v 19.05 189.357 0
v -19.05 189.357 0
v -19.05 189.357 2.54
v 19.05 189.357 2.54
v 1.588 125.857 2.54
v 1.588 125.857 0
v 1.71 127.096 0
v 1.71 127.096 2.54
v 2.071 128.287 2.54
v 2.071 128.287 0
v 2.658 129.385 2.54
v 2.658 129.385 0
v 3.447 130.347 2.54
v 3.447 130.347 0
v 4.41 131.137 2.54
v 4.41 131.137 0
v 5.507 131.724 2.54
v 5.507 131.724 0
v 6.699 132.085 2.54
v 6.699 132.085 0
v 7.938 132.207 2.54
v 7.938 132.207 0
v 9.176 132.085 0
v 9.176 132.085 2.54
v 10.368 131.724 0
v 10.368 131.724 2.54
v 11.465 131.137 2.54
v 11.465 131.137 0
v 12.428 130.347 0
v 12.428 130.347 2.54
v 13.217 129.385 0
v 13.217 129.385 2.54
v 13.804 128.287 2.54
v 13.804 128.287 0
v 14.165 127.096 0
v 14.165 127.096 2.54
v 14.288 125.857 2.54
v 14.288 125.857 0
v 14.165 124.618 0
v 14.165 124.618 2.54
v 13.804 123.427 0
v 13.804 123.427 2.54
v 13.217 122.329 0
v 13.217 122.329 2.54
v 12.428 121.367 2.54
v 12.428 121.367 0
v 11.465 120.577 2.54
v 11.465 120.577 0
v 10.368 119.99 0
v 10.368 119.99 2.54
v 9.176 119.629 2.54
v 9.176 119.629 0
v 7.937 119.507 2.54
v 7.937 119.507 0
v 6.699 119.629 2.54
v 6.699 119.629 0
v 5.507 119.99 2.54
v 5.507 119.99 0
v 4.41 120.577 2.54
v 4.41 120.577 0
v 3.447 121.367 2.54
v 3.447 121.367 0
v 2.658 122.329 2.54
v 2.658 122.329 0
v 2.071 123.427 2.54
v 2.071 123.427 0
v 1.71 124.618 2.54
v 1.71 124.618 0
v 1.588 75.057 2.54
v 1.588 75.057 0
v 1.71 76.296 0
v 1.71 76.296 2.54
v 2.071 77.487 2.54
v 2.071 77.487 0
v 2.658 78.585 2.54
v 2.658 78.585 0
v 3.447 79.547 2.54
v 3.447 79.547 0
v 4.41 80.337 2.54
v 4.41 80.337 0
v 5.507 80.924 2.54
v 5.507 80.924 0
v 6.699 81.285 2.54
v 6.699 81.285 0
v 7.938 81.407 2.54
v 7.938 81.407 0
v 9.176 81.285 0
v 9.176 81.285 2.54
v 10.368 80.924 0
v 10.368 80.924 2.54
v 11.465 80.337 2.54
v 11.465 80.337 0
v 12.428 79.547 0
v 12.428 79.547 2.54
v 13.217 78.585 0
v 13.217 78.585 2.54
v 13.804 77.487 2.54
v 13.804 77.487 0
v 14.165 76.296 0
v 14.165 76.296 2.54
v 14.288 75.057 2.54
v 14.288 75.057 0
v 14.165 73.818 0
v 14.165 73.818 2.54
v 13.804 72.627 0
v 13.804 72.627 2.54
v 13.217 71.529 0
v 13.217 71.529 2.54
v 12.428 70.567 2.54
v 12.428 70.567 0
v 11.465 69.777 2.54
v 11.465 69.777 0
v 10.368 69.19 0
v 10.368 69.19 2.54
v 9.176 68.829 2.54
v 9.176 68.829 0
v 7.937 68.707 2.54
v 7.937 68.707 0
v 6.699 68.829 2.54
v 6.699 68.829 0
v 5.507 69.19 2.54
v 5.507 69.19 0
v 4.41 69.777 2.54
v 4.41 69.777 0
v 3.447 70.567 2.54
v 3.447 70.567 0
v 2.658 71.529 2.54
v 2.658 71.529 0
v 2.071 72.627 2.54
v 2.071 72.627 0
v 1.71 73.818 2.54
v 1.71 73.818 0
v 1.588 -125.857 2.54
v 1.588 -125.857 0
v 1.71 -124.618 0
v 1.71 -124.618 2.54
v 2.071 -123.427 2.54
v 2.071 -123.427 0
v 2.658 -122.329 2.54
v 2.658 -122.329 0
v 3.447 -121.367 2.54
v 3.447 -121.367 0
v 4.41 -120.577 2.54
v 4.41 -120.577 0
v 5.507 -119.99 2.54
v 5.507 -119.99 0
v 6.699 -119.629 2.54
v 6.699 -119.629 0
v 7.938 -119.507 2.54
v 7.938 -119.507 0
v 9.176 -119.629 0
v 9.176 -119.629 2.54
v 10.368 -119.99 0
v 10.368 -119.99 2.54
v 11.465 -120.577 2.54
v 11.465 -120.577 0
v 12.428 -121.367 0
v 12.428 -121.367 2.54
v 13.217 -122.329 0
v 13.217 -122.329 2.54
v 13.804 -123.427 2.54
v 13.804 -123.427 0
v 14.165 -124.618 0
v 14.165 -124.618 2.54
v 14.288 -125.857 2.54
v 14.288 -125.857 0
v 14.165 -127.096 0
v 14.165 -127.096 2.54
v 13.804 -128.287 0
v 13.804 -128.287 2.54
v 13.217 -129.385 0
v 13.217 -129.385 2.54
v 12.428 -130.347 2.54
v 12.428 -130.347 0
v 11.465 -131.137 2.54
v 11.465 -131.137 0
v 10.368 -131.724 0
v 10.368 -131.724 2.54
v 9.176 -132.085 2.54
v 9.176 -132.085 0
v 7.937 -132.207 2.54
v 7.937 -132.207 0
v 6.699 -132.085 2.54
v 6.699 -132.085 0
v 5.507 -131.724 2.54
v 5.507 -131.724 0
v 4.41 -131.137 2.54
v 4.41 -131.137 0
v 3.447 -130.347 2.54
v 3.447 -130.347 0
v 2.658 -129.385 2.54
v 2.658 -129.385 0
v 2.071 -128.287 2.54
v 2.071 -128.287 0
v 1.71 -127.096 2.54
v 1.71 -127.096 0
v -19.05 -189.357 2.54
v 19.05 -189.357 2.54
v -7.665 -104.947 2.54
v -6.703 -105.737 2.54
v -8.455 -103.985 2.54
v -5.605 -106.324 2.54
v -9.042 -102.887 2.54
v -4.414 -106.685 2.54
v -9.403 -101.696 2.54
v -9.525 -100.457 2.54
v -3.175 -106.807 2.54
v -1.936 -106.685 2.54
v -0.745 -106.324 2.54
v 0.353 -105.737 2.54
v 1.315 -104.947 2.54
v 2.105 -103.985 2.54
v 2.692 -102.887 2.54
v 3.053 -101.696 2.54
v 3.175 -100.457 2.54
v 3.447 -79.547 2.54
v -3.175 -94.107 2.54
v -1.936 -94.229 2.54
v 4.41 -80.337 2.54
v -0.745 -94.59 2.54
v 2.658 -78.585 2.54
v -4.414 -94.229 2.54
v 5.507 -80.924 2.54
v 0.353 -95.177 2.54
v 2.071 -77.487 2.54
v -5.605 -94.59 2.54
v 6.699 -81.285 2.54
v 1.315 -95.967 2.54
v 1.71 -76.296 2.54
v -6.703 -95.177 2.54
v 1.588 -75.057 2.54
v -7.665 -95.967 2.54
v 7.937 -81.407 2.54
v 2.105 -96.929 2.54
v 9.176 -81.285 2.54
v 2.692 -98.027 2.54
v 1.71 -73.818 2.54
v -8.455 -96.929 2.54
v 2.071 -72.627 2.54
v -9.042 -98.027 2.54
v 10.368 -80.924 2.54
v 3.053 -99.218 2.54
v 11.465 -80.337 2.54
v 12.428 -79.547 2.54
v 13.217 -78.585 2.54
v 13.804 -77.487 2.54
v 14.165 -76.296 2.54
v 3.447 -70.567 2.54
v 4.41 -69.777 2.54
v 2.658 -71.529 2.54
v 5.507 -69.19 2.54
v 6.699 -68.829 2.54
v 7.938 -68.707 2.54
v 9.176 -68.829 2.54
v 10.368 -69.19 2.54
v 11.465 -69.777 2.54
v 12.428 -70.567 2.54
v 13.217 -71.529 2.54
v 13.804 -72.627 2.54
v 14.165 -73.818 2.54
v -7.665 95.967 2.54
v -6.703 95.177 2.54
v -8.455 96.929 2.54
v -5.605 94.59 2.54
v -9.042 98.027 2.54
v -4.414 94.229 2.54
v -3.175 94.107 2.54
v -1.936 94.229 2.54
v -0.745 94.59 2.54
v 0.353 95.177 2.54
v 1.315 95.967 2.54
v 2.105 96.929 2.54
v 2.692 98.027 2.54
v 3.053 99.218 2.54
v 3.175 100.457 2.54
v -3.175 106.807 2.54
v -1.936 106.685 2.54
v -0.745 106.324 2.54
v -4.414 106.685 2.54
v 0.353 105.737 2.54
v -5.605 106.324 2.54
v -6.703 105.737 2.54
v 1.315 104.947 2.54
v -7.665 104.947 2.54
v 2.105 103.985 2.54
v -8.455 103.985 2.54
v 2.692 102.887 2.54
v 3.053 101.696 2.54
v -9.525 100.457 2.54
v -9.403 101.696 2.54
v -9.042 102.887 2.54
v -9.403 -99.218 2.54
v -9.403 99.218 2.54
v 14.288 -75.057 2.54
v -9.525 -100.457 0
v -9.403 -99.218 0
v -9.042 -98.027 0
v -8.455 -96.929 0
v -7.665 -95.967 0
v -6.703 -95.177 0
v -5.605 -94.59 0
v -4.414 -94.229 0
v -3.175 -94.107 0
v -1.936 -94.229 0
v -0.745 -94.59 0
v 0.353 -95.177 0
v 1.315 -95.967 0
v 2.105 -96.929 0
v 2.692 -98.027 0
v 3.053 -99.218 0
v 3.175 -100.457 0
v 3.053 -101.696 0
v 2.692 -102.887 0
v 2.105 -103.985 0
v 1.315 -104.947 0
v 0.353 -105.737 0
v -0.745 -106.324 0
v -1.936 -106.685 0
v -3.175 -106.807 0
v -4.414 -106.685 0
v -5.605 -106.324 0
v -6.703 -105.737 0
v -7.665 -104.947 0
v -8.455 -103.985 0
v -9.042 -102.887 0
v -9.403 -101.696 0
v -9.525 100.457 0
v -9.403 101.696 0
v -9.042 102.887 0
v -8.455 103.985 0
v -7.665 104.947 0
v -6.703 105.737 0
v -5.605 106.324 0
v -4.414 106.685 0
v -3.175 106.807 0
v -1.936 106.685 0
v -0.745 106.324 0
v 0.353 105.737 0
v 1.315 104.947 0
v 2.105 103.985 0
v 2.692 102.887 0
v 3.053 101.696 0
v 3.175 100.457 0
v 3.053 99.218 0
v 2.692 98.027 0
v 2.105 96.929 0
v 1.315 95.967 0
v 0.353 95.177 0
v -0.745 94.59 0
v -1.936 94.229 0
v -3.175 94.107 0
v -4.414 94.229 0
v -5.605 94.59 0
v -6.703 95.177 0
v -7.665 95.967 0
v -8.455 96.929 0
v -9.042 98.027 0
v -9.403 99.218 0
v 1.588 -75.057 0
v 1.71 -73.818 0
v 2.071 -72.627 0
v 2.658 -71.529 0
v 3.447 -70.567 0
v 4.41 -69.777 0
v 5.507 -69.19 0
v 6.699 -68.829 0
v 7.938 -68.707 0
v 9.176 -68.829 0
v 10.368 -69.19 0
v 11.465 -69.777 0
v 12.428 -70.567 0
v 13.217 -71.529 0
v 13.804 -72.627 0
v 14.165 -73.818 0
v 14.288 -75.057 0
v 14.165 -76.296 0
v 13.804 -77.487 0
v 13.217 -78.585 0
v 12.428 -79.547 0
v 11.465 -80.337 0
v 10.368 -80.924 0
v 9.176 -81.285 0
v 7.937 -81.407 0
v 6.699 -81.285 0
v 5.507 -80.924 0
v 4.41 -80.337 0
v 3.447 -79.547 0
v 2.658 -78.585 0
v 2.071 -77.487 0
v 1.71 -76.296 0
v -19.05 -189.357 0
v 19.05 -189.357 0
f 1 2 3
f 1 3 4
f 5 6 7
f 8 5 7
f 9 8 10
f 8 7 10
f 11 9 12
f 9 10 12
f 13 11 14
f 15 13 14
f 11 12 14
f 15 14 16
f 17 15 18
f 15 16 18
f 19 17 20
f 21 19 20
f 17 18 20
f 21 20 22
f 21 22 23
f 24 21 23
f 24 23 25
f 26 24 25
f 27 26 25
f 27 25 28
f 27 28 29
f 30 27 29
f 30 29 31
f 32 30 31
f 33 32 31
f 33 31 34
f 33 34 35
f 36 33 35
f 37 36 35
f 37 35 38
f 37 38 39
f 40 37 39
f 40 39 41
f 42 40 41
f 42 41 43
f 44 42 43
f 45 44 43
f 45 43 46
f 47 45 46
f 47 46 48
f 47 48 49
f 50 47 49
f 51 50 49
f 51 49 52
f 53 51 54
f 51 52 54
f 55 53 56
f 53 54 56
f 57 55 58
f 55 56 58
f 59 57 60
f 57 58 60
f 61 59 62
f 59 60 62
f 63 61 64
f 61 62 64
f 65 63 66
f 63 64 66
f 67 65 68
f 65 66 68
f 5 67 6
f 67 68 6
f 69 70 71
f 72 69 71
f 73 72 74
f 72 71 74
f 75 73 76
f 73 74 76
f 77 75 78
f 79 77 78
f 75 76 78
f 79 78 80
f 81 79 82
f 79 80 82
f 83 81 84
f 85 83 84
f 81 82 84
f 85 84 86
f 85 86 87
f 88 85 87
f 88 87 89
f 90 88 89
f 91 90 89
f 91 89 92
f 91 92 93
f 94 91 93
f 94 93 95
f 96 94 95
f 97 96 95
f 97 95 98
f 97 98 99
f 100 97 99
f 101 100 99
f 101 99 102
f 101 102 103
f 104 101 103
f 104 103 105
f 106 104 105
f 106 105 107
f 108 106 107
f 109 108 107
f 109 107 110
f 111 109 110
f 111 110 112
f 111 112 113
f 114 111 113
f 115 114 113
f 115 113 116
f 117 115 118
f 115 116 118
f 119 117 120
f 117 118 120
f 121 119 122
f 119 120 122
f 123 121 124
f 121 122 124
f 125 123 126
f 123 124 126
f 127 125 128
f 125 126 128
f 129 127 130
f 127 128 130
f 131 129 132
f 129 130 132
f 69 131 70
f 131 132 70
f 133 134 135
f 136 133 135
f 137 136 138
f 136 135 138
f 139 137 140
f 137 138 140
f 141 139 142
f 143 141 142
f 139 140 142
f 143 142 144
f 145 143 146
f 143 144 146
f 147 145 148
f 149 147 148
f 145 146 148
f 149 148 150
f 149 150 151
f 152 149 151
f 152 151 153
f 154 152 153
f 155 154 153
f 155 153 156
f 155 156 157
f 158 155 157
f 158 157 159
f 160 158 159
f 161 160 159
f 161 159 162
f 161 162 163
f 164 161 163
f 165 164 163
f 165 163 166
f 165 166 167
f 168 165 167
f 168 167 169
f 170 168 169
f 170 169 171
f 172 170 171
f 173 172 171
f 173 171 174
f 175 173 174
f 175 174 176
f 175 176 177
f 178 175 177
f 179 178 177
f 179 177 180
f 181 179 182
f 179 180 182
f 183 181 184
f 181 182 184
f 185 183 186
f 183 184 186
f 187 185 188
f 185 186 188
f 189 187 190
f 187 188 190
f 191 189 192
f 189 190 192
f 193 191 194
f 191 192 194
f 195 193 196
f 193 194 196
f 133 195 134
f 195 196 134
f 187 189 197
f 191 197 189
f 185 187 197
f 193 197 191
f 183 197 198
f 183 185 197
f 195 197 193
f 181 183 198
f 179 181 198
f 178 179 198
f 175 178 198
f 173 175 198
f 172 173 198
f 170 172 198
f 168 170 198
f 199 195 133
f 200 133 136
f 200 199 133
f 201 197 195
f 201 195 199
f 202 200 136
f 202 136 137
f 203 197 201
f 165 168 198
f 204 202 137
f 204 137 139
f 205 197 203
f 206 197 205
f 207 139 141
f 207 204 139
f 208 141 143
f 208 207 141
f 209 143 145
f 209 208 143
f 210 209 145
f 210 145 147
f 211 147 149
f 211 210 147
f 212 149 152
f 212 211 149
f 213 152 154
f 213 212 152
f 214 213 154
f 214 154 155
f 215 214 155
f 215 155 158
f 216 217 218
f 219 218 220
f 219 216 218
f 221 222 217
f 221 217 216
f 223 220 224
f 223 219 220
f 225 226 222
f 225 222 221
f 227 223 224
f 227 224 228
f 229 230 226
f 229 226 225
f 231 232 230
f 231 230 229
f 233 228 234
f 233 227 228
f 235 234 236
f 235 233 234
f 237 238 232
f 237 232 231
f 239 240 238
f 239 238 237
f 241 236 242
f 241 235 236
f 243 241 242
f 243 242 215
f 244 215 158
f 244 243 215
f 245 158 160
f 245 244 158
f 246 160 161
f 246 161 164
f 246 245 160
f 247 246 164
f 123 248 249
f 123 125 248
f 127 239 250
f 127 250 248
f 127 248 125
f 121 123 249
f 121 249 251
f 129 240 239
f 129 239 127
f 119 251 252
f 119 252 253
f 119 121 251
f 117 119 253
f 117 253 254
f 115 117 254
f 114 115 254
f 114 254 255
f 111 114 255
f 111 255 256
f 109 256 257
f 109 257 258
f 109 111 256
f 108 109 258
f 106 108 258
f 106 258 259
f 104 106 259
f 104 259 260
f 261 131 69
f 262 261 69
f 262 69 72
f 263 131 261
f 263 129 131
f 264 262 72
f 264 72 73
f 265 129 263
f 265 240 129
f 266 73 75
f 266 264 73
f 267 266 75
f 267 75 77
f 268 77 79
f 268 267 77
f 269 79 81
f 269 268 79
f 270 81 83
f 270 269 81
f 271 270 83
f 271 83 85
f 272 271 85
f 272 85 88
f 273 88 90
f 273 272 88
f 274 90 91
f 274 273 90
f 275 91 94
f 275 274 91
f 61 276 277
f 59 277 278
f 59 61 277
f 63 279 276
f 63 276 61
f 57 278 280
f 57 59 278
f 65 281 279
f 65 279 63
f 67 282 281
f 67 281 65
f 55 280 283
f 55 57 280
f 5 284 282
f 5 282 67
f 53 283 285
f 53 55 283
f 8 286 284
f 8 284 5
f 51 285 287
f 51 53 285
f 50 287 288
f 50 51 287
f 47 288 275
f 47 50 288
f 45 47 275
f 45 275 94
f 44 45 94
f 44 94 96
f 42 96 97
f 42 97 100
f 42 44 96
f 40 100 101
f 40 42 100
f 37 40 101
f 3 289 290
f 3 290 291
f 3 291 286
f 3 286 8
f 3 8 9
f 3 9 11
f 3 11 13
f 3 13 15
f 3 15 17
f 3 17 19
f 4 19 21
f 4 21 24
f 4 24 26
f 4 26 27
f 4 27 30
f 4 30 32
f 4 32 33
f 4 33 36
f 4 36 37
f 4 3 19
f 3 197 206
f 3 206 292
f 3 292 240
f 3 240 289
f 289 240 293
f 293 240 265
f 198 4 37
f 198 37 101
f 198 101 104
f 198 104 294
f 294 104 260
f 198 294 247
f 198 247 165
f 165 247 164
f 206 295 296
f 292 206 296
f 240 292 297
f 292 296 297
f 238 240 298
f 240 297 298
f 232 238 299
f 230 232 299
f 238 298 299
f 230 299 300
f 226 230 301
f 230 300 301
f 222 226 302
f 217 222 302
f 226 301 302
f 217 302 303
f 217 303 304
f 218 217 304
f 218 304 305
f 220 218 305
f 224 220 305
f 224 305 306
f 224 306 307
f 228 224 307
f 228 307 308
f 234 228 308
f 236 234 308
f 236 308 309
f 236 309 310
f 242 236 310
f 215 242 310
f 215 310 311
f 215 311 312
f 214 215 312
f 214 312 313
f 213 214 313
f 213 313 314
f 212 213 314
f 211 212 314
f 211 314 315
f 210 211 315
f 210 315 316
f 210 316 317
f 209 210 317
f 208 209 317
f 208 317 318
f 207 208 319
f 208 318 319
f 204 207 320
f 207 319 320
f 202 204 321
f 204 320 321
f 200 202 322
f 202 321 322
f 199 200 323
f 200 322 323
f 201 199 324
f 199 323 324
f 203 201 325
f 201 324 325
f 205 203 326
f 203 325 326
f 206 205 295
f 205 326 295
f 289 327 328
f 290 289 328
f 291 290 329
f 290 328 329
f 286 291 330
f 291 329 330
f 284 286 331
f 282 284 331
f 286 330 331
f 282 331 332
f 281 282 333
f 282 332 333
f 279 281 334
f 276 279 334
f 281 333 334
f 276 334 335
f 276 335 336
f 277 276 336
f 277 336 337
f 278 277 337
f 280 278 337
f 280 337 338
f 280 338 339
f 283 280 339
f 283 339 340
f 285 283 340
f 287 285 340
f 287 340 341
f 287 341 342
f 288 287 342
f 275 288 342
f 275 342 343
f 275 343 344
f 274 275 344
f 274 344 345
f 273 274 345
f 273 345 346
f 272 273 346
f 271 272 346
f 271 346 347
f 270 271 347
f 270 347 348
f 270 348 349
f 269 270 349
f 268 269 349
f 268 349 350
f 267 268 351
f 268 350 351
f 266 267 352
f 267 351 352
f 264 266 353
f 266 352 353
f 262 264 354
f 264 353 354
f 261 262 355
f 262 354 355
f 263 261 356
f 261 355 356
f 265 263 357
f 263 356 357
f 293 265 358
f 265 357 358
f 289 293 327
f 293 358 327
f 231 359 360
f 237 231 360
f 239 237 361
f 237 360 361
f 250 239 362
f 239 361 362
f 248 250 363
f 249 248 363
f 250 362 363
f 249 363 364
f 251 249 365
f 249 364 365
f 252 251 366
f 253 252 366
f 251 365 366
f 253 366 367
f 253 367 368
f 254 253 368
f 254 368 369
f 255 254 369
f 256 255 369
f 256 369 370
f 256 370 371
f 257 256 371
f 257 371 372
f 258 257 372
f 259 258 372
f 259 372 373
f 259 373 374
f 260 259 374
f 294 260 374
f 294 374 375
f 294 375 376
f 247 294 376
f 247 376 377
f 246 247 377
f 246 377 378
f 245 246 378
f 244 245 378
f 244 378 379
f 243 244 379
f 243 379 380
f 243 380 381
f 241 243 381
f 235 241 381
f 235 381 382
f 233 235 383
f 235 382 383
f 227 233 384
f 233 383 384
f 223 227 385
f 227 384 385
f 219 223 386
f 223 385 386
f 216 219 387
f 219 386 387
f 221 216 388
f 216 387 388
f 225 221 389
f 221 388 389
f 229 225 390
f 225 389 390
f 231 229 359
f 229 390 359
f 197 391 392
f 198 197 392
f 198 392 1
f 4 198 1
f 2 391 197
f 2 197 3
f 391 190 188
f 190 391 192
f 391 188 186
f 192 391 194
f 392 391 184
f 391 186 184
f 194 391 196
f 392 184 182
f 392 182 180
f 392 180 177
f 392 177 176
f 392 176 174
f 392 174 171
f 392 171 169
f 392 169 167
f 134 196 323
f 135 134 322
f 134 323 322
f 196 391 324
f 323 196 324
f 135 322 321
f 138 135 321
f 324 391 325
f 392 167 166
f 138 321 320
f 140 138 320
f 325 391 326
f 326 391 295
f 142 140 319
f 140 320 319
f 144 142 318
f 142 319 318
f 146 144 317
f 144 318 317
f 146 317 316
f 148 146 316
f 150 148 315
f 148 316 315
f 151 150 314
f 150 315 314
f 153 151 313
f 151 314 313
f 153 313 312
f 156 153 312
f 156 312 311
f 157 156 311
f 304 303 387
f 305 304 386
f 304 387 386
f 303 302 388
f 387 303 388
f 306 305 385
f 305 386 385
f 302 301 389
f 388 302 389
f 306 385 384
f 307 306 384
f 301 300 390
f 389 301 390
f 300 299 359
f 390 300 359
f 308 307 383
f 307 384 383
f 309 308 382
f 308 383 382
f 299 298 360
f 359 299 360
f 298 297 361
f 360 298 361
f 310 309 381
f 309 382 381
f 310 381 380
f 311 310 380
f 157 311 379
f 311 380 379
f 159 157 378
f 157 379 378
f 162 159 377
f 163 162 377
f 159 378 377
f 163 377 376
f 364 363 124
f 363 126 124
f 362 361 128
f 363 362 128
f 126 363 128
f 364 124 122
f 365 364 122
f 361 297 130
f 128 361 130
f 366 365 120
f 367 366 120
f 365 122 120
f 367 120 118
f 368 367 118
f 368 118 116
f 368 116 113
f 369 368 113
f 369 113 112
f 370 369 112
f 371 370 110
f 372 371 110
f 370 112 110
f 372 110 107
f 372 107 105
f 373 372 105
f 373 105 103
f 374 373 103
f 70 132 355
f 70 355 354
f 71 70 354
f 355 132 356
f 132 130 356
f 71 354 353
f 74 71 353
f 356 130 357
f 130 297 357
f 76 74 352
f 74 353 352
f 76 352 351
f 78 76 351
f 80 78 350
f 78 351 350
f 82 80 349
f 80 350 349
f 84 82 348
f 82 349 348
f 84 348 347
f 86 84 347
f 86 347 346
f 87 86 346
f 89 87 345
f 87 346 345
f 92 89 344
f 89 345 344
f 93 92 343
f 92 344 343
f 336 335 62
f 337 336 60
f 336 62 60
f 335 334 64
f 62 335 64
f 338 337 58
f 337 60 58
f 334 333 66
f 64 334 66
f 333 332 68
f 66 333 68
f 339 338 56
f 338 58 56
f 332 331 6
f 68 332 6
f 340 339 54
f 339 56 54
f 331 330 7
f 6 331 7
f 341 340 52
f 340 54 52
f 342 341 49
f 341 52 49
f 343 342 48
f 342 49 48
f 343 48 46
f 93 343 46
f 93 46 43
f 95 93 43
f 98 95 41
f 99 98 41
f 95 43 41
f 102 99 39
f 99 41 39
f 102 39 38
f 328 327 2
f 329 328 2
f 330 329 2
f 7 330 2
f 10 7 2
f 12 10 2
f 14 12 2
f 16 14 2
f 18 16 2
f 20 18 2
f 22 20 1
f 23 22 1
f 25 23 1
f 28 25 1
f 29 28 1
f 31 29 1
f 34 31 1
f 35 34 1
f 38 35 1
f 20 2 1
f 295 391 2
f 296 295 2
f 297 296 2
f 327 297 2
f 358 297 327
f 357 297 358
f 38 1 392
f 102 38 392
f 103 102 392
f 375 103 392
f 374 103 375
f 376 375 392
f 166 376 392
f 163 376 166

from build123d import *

# Parameters (mm, degrees)
F0_W     = 38.1
F0_H     = 378.714
F1_DEPTH = 2.54
F5_D     = 12.7
F9_D     = 12.7


with BuildPart() as f1:
    # F0 (on Top) → F1 (new body)
    with BuildSketch(Plane.XY):
        Rectangle(F0_W, F0_H)
    extrude(amount=F1_DEPTH)

    # F5 (through all)
    with Locations(Plane.XY.offset(2.54)):
        with Locations((-3.175, 100.457), (7.9375, 75.057), (7.9375, 125.857)):
            Hole(F5_D / 2)

    # F9 (through all)
    with Locations(Plane.XY.offset(2.54)):
        with Locations((7.9375, -125.857), (-3.175, -100.457), (7.9375, -75.057)):
            Hole(F9_D / 2)


solid = f1.part
